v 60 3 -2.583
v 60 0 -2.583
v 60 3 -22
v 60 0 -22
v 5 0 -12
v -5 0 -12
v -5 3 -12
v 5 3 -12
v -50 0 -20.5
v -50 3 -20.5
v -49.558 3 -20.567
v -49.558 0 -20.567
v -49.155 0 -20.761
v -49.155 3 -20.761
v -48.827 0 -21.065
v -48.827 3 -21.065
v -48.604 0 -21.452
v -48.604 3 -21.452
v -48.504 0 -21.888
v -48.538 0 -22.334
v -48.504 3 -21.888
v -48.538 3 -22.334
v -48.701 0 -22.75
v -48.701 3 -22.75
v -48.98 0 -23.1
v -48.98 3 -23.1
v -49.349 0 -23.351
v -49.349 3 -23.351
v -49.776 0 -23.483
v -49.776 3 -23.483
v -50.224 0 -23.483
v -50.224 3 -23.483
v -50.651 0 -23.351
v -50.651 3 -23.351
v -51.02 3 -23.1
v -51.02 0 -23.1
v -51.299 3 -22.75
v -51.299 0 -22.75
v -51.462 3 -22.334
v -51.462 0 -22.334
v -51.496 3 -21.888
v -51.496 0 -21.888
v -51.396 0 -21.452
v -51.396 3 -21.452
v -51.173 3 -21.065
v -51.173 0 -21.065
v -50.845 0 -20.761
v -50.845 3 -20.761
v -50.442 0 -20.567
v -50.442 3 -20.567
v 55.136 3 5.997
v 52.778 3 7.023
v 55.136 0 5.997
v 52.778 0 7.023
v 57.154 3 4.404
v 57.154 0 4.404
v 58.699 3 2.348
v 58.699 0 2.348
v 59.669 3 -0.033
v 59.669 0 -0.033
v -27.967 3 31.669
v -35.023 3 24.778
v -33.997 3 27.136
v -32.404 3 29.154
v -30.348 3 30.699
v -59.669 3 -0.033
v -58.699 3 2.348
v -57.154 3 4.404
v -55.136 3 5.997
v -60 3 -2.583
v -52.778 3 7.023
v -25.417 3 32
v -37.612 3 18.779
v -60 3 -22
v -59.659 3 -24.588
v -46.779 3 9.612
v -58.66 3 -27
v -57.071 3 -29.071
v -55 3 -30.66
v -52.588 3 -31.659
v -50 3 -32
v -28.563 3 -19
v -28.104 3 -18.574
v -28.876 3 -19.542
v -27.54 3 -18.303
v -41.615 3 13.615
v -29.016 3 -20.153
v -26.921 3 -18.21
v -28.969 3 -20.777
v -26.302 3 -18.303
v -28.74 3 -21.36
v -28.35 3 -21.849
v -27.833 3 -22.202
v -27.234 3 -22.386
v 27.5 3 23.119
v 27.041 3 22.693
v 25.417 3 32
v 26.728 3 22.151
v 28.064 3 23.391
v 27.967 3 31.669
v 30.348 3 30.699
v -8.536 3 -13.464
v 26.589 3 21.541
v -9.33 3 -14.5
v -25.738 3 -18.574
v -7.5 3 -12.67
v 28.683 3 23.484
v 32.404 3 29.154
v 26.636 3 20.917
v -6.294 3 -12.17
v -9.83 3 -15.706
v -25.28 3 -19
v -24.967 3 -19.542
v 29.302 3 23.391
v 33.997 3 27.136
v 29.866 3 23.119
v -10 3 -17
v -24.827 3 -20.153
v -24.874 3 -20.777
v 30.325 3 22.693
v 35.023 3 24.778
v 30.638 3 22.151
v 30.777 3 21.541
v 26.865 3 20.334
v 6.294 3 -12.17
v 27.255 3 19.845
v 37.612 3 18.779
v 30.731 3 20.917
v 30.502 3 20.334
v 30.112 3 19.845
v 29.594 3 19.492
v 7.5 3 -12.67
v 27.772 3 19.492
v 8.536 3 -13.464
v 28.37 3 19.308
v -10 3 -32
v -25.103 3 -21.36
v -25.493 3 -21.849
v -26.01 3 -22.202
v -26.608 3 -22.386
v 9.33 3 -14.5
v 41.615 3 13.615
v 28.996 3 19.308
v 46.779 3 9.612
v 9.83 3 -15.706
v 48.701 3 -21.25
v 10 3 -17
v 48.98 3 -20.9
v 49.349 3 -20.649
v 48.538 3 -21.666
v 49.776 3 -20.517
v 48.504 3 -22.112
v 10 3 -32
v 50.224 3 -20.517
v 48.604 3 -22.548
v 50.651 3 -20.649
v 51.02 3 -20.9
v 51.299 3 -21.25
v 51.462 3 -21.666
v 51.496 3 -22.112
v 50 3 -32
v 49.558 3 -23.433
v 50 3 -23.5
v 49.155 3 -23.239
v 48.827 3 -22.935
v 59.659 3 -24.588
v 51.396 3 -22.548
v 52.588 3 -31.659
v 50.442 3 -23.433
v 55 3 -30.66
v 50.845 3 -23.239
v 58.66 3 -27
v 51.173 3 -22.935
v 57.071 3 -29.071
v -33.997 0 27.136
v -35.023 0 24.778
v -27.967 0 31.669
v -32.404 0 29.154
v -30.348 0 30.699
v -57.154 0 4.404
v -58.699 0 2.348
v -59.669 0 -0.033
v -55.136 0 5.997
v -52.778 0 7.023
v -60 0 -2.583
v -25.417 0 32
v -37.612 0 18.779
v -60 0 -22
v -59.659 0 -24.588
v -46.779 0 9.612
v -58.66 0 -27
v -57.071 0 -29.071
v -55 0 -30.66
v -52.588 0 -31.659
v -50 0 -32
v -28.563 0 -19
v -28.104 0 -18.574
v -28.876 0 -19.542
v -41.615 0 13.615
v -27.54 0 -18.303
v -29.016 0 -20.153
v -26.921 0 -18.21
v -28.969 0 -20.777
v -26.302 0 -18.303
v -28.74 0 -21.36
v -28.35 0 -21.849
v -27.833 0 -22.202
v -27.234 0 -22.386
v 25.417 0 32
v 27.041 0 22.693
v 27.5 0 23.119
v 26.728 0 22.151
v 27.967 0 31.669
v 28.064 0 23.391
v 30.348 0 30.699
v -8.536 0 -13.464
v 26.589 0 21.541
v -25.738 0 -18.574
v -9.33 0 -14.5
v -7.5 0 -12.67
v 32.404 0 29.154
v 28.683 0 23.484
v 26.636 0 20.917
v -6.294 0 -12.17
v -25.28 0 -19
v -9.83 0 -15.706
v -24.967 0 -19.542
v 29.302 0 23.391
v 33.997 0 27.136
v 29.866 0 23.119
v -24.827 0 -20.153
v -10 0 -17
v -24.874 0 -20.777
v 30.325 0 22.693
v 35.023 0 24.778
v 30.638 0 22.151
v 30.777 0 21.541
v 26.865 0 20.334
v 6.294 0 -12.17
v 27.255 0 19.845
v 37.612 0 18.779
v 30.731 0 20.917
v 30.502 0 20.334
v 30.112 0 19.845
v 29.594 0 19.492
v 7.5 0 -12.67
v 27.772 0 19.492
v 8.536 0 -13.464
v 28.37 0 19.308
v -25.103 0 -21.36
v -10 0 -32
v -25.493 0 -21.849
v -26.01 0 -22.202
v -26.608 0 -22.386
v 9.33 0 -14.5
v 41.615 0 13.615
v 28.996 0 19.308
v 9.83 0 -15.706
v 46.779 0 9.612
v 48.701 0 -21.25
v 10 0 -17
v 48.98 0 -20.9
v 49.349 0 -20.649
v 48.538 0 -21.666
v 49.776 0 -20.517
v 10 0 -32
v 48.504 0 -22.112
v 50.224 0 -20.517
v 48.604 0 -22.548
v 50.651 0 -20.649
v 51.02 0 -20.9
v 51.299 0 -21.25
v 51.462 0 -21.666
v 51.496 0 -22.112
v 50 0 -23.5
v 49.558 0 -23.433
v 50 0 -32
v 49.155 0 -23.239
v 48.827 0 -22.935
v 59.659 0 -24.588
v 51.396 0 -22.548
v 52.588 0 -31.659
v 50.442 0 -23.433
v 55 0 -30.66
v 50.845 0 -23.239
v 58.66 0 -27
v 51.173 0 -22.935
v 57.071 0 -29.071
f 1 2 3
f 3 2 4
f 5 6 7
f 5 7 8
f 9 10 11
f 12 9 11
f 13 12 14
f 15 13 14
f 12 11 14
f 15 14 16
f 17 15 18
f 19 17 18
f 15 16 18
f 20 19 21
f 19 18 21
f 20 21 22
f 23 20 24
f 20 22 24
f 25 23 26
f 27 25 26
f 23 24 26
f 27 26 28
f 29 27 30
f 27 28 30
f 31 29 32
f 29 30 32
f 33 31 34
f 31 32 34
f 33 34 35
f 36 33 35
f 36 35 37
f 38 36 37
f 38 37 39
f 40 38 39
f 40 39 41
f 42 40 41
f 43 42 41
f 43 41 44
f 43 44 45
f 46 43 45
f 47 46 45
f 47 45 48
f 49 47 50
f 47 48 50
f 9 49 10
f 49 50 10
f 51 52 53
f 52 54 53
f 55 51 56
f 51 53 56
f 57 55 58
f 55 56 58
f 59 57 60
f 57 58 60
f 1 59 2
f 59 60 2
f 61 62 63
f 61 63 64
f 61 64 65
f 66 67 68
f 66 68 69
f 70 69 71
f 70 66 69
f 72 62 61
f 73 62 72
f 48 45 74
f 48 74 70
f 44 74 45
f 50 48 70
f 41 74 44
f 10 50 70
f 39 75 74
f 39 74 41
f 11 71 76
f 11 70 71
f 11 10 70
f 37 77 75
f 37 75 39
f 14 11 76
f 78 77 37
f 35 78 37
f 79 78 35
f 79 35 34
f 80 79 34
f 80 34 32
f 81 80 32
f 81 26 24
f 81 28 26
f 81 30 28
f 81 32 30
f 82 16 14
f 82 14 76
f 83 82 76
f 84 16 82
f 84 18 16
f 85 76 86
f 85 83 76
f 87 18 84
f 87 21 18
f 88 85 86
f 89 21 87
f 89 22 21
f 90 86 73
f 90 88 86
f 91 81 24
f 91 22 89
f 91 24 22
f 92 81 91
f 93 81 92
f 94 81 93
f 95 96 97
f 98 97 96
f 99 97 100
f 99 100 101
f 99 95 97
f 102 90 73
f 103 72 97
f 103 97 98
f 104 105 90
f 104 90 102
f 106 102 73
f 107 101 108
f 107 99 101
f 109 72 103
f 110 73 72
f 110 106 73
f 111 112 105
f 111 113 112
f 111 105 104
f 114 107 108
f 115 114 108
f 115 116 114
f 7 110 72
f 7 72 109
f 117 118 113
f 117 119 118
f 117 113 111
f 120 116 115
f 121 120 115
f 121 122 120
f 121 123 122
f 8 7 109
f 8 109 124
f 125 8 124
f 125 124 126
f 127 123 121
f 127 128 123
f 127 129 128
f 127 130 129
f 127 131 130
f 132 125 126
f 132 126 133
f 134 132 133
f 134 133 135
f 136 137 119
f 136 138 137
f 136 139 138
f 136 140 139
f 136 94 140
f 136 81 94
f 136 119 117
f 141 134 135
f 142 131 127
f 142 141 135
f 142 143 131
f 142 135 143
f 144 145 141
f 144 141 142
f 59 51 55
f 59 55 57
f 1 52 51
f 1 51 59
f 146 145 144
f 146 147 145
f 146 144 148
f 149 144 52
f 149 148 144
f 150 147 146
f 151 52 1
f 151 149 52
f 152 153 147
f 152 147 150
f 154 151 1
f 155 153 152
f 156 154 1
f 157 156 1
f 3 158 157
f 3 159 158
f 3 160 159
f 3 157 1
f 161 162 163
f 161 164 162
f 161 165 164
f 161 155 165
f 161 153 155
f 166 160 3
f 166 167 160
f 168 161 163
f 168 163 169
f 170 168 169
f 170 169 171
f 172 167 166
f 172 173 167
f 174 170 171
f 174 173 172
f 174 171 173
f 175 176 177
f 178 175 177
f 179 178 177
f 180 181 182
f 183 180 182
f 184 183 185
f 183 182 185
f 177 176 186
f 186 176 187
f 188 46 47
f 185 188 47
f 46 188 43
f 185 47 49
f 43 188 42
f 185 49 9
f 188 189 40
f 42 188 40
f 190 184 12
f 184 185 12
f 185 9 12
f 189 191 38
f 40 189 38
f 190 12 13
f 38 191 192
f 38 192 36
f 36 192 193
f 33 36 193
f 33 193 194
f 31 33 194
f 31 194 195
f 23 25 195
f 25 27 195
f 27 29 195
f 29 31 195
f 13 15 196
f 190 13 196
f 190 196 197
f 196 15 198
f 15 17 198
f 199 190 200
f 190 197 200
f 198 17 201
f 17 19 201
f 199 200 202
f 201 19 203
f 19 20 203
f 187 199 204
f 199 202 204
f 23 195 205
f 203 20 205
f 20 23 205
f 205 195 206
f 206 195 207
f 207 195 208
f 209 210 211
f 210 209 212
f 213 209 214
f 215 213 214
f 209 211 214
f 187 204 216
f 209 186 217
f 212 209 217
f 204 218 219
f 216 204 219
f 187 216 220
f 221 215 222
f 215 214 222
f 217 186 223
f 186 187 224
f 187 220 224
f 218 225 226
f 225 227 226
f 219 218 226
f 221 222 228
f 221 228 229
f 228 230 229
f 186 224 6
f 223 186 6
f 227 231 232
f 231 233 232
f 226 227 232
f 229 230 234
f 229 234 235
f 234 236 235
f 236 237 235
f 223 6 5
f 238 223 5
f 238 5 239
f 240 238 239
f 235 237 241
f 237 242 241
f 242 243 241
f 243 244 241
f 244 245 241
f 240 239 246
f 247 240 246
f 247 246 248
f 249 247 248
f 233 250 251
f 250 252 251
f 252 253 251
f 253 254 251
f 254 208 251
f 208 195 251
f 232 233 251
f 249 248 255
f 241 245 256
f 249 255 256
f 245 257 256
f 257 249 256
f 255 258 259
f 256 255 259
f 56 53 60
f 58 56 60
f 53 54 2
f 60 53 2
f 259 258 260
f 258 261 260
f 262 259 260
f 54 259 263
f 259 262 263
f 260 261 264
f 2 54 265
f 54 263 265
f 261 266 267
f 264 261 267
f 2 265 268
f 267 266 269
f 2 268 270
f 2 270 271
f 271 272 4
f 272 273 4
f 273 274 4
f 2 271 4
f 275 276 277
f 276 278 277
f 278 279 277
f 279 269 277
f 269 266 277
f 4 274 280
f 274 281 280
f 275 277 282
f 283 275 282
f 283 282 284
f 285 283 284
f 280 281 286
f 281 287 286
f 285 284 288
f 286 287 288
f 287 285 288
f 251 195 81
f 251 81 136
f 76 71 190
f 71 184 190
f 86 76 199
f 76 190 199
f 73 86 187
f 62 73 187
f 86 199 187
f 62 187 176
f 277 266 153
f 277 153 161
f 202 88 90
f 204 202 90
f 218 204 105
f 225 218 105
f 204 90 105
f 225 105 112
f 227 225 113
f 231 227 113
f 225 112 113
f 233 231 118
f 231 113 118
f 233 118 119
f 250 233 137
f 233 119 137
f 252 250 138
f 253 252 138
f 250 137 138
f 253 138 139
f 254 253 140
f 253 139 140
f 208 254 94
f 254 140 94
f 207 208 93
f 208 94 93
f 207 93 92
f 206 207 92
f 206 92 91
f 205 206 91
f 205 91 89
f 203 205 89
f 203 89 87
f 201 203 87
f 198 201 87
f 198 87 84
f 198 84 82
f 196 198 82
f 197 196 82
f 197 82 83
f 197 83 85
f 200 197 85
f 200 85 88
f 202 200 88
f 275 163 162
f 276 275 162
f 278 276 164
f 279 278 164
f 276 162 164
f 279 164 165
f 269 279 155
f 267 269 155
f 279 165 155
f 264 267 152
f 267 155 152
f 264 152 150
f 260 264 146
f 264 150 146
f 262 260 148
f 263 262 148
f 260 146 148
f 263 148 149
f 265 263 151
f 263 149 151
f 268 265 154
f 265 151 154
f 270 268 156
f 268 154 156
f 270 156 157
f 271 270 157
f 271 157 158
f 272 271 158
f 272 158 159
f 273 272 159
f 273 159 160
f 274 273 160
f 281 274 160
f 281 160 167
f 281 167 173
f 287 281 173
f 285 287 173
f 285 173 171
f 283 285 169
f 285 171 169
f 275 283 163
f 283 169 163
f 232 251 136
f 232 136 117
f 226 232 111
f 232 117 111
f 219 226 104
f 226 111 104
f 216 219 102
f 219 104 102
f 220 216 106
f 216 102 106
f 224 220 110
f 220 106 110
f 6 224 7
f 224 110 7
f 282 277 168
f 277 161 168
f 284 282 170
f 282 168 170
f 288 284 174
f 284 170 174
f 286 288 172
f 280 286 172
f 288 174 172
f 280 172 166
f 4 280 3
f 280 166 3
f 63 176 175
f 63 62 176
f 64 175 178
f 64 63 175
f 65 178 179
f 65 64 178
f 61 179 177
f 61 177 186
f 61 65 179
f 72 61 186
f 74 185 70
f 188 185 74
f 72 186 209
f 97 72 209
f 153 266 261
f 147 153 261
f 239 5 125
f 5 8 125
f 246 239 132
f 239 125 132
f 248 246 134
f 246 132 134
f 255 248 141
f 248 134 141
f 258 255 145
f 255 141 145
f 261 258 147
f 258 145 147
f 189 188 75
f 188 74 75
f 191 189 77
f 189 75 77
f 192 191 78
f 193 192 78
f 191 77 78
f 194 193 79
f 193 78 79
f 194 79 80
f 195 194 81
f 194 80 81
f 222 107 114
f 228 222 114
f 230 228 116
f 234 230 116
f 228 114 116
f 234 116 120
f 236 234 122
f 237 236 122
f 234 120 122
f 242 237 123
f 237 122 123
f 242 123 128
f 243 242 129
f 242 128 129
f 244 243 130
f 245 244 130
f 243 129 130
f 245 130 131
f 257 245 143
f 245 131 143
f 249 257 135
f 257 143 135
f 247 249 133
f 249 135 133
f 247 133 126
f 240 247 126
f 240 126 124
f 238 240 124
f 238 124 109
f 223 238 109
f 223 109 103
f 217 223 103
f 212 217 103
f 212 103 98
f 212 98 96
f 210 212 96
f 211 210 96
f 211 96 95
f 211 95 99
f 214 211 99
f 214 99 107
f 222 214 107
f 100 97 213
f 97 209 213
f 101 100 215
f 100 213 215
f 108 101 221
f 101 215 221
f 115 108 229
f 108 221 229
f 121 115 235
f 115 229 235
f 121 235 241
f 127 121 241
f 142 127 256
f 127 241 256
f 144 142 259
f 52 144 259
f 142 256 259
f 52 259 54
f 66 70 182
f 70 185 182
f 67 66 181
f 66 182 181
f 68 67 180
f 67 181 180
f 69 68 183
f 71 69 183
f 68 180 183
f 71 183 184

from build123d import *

# Parameters (mm, degrees)
SKETCH_1_W          = 120
SKETCH_1_H          = 64
EXTRUDE_1_DEPTH     = 3
SKETCH_2_R          = 1.5
CUT_EXTRUDE_1_DEPTH = 3
FILLET_1_R          = 10
SKETCH_3_W          = 20
SKETCH_3_H          = 20
CUT_EXTRUDE_2_DEPTH = 3
SKETCH_4_R          = 26
CUT_EXTRUDE_3_DEPTH = 3
FILLET_2_R          = 5
FILLET_3_R          = 10
FILLET_4_R          = 10
SKETCH_6_R          = 2.1
CUT_EXTRUDE_5_DEPTH = 6


with BuildPart() as part:
    # 草图1 → 凸台-拉伸1 (new body)
    with BuildSketch(Plane(origin=(0, 0, 0), x_dir=(1, 0, 0), z_dir=(0, 1, 0))):
        Rectangle(SKETCH_1_W, SKETCH_1_H)
    extrude(amount=EXTRUDE_1_DEPTH)

    # 草图2 → 切除-拉伸1 (cut)
    with BuildSketch(Plane(origin=(0, 3, 0), x_dir=(1, 0, 0), z_dir=(0, 1, 0))):
        with Locations(Location((-50, 22, 0), (0, 0, 270))):
            Circle(SKETCH_2_R)
        with Locations(Location((50, 22, 0), (0, 0, 90))):
            Circle(SKETCH_2_R)
    extrude(amount=-CUT_EXTRUDE_1_DEPTH, mode=Mode.SUBTRACT)

    # 圆角1
    fillet_1_edges = [part.edges().sort_by_distance(p)[0] for p in [
        (-60, 1.5, -32),
        (60, 1.5, -32),
    ]]
    fillet(fillet_1_edges, radius=FILLET_1_R)

    # 草图3 → 切除-拉伸2 (cut)
    with BuildSketch(Plane.XZ):
        with Locations((0, -22)):
            Rectangle(SKETCH_3_W, SKETCH_3_H)
    extrude(amount=-CUT_EXTRUDE_2_DEPTH, mode=Mode.SUBTRACT)

    # 草图4 → 切除-拉伸3 (cut)
    with BuildSketch(Plane.XZ):
        with Locations((-60, 32)):
            Circle(SKETCH_4_R)
        with Locations((60, 32)):
            Circle(SKETCH_4_R)
    extrude(amount=-CUT_EXTRUDE_3_DEPTH, mode=Mode.SUBTRACT)

    # 圆角2
    fillet_2_edges = [part.edges().sort_by_distance(p)[0] for p in [
        (-10, 1.5, -12),
        (10, 1.5, -12),
    ]]
    fillet(fillet_2_edges, radius=FILLET_2_R)

    # 圆角3
    fillet_3_edges = [part.edges().sort_by_distance(p)[0] for p in [
        (-60, 1.5, 6),
        (60, 1.5, 6),
    ]]
    fillet(fillet_3_edges, radius=FILLET_3_R)

    # 圆角4
    fillet_4_edges = [part.edges().sort_by_distance(p)[0] for p in [
        (-34, 1.5, 32),
        (34, 1.5, 32),
    ]]
    fillet(fillet_4_edges, radius=FILLET_4_R)

    # 草图6 → 切除-拉伸5 (cut)
    with BuildSketch(Plane(origin=(0, 3, 189.146349293), x_dir=(0, 0, 1), z_dir=(0, 1, 0))):
        with Locations((-209.45594255, -26.921391455)):
            Circle(SKETCH_6_R)
        with Locations((-167.762204108, 28.683304163)):
            Circle(SKETCH_6_R)
    extrude(amount=-CUT_EXTRUDE_5_DEPTH, mode=Mode.SUBTRACT)


solid = part.part
